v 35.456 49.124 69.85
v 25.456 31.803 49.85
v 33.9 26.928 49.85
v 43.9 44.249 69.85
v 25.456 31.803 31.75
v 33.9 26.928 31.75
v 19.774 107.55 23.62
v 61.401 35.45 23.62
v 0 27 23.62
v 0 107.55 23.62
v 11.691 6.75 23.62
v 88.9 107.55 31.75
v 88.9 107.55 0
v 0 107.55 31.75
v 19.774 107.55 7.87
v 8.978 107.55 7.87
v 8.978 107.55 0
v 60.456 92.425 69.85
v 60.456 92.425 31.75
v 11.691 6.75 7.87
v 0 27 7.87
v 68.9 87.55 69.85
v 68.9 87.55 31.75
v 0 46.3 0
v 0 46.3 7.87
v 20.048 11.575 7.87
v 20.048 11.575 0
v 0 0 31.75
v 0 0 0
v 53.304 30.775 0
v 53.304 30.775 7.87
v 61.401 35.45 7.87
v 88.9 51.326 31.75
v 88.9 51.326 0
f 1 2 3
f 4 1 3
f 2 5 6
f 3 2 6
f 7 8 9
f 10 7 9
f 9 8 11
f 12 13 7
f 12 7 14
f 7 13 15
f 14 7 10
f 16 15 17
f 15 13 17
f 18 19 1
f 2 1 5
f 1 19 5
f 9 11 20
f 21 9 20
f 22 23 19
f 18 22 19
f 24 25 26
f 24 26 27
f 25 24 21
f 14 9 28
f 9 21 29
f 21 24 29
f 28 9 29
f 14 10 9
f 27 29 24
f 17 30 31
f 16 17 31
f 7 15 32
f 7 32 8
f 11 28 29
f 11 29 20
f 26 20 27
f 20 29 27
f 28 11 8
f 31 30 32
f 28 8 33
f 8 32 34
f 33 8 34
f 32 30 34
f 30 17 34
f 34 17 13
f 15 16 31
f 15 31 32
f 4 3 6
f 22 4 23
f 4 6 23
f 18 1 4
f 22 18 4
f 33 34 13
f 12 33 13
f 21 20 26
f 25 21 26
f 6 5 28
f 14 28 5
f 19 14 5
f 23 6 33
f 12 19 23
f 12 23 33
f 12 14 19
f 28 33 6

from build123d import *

# Parameters (mm, degrees)
F1_DEPTH = 31.75
F3_DEPTH = 120
F5_DEPTH = 38.1
F6_SIZE  = 20


with BuildPart() as f1:
    # F0 (on Top) → F1 (new body)
    with BuildSketch(Plane.XY):
        Polygon((88.9, 107.55), (0, 107.55), (0, 0), (88.9, 51.326438931), align=None)
    extrude(amount=F1_DEPTH)

    # F2 (on face) → F3 (cut)
    with BuildSketch(Plane(origin=(0, 0, 0), x_dir=(0.8660254038, 0.5, 0), z_dir=(0.5, -0.8660254038, 0))):
        Polygon((70.9, 23.62), (13.5, 23.62), (13.5, 7.87), (23.15, 7.87), (23.15, 0), (61.55, 0), (61.55, 7.87), (70.9, 7.87), align=None)
    extrude(amount=-F3_DEPTH, mode=Mode.SUBTRACT)

    # F4 (on face) → F5 (join)
    with BuildSketch(Plane.XY.offset(31.75)):
        Polygon((33.9, 26.9282217351), (68.9, 87.55), (60.4562523131, 92.425), (25.4562523131, 31.8032217351), align=None)
    extrude(amount=F5_DEPTH)

    # F6
    f6_edges = [f1.edges().sort_by_distance(p)[0] for p in [
        (29.678126, 29.365722, 69.85),
    ]]
    chamfer(f6_edges, length=F6_SIZE)


solid = f1.part
